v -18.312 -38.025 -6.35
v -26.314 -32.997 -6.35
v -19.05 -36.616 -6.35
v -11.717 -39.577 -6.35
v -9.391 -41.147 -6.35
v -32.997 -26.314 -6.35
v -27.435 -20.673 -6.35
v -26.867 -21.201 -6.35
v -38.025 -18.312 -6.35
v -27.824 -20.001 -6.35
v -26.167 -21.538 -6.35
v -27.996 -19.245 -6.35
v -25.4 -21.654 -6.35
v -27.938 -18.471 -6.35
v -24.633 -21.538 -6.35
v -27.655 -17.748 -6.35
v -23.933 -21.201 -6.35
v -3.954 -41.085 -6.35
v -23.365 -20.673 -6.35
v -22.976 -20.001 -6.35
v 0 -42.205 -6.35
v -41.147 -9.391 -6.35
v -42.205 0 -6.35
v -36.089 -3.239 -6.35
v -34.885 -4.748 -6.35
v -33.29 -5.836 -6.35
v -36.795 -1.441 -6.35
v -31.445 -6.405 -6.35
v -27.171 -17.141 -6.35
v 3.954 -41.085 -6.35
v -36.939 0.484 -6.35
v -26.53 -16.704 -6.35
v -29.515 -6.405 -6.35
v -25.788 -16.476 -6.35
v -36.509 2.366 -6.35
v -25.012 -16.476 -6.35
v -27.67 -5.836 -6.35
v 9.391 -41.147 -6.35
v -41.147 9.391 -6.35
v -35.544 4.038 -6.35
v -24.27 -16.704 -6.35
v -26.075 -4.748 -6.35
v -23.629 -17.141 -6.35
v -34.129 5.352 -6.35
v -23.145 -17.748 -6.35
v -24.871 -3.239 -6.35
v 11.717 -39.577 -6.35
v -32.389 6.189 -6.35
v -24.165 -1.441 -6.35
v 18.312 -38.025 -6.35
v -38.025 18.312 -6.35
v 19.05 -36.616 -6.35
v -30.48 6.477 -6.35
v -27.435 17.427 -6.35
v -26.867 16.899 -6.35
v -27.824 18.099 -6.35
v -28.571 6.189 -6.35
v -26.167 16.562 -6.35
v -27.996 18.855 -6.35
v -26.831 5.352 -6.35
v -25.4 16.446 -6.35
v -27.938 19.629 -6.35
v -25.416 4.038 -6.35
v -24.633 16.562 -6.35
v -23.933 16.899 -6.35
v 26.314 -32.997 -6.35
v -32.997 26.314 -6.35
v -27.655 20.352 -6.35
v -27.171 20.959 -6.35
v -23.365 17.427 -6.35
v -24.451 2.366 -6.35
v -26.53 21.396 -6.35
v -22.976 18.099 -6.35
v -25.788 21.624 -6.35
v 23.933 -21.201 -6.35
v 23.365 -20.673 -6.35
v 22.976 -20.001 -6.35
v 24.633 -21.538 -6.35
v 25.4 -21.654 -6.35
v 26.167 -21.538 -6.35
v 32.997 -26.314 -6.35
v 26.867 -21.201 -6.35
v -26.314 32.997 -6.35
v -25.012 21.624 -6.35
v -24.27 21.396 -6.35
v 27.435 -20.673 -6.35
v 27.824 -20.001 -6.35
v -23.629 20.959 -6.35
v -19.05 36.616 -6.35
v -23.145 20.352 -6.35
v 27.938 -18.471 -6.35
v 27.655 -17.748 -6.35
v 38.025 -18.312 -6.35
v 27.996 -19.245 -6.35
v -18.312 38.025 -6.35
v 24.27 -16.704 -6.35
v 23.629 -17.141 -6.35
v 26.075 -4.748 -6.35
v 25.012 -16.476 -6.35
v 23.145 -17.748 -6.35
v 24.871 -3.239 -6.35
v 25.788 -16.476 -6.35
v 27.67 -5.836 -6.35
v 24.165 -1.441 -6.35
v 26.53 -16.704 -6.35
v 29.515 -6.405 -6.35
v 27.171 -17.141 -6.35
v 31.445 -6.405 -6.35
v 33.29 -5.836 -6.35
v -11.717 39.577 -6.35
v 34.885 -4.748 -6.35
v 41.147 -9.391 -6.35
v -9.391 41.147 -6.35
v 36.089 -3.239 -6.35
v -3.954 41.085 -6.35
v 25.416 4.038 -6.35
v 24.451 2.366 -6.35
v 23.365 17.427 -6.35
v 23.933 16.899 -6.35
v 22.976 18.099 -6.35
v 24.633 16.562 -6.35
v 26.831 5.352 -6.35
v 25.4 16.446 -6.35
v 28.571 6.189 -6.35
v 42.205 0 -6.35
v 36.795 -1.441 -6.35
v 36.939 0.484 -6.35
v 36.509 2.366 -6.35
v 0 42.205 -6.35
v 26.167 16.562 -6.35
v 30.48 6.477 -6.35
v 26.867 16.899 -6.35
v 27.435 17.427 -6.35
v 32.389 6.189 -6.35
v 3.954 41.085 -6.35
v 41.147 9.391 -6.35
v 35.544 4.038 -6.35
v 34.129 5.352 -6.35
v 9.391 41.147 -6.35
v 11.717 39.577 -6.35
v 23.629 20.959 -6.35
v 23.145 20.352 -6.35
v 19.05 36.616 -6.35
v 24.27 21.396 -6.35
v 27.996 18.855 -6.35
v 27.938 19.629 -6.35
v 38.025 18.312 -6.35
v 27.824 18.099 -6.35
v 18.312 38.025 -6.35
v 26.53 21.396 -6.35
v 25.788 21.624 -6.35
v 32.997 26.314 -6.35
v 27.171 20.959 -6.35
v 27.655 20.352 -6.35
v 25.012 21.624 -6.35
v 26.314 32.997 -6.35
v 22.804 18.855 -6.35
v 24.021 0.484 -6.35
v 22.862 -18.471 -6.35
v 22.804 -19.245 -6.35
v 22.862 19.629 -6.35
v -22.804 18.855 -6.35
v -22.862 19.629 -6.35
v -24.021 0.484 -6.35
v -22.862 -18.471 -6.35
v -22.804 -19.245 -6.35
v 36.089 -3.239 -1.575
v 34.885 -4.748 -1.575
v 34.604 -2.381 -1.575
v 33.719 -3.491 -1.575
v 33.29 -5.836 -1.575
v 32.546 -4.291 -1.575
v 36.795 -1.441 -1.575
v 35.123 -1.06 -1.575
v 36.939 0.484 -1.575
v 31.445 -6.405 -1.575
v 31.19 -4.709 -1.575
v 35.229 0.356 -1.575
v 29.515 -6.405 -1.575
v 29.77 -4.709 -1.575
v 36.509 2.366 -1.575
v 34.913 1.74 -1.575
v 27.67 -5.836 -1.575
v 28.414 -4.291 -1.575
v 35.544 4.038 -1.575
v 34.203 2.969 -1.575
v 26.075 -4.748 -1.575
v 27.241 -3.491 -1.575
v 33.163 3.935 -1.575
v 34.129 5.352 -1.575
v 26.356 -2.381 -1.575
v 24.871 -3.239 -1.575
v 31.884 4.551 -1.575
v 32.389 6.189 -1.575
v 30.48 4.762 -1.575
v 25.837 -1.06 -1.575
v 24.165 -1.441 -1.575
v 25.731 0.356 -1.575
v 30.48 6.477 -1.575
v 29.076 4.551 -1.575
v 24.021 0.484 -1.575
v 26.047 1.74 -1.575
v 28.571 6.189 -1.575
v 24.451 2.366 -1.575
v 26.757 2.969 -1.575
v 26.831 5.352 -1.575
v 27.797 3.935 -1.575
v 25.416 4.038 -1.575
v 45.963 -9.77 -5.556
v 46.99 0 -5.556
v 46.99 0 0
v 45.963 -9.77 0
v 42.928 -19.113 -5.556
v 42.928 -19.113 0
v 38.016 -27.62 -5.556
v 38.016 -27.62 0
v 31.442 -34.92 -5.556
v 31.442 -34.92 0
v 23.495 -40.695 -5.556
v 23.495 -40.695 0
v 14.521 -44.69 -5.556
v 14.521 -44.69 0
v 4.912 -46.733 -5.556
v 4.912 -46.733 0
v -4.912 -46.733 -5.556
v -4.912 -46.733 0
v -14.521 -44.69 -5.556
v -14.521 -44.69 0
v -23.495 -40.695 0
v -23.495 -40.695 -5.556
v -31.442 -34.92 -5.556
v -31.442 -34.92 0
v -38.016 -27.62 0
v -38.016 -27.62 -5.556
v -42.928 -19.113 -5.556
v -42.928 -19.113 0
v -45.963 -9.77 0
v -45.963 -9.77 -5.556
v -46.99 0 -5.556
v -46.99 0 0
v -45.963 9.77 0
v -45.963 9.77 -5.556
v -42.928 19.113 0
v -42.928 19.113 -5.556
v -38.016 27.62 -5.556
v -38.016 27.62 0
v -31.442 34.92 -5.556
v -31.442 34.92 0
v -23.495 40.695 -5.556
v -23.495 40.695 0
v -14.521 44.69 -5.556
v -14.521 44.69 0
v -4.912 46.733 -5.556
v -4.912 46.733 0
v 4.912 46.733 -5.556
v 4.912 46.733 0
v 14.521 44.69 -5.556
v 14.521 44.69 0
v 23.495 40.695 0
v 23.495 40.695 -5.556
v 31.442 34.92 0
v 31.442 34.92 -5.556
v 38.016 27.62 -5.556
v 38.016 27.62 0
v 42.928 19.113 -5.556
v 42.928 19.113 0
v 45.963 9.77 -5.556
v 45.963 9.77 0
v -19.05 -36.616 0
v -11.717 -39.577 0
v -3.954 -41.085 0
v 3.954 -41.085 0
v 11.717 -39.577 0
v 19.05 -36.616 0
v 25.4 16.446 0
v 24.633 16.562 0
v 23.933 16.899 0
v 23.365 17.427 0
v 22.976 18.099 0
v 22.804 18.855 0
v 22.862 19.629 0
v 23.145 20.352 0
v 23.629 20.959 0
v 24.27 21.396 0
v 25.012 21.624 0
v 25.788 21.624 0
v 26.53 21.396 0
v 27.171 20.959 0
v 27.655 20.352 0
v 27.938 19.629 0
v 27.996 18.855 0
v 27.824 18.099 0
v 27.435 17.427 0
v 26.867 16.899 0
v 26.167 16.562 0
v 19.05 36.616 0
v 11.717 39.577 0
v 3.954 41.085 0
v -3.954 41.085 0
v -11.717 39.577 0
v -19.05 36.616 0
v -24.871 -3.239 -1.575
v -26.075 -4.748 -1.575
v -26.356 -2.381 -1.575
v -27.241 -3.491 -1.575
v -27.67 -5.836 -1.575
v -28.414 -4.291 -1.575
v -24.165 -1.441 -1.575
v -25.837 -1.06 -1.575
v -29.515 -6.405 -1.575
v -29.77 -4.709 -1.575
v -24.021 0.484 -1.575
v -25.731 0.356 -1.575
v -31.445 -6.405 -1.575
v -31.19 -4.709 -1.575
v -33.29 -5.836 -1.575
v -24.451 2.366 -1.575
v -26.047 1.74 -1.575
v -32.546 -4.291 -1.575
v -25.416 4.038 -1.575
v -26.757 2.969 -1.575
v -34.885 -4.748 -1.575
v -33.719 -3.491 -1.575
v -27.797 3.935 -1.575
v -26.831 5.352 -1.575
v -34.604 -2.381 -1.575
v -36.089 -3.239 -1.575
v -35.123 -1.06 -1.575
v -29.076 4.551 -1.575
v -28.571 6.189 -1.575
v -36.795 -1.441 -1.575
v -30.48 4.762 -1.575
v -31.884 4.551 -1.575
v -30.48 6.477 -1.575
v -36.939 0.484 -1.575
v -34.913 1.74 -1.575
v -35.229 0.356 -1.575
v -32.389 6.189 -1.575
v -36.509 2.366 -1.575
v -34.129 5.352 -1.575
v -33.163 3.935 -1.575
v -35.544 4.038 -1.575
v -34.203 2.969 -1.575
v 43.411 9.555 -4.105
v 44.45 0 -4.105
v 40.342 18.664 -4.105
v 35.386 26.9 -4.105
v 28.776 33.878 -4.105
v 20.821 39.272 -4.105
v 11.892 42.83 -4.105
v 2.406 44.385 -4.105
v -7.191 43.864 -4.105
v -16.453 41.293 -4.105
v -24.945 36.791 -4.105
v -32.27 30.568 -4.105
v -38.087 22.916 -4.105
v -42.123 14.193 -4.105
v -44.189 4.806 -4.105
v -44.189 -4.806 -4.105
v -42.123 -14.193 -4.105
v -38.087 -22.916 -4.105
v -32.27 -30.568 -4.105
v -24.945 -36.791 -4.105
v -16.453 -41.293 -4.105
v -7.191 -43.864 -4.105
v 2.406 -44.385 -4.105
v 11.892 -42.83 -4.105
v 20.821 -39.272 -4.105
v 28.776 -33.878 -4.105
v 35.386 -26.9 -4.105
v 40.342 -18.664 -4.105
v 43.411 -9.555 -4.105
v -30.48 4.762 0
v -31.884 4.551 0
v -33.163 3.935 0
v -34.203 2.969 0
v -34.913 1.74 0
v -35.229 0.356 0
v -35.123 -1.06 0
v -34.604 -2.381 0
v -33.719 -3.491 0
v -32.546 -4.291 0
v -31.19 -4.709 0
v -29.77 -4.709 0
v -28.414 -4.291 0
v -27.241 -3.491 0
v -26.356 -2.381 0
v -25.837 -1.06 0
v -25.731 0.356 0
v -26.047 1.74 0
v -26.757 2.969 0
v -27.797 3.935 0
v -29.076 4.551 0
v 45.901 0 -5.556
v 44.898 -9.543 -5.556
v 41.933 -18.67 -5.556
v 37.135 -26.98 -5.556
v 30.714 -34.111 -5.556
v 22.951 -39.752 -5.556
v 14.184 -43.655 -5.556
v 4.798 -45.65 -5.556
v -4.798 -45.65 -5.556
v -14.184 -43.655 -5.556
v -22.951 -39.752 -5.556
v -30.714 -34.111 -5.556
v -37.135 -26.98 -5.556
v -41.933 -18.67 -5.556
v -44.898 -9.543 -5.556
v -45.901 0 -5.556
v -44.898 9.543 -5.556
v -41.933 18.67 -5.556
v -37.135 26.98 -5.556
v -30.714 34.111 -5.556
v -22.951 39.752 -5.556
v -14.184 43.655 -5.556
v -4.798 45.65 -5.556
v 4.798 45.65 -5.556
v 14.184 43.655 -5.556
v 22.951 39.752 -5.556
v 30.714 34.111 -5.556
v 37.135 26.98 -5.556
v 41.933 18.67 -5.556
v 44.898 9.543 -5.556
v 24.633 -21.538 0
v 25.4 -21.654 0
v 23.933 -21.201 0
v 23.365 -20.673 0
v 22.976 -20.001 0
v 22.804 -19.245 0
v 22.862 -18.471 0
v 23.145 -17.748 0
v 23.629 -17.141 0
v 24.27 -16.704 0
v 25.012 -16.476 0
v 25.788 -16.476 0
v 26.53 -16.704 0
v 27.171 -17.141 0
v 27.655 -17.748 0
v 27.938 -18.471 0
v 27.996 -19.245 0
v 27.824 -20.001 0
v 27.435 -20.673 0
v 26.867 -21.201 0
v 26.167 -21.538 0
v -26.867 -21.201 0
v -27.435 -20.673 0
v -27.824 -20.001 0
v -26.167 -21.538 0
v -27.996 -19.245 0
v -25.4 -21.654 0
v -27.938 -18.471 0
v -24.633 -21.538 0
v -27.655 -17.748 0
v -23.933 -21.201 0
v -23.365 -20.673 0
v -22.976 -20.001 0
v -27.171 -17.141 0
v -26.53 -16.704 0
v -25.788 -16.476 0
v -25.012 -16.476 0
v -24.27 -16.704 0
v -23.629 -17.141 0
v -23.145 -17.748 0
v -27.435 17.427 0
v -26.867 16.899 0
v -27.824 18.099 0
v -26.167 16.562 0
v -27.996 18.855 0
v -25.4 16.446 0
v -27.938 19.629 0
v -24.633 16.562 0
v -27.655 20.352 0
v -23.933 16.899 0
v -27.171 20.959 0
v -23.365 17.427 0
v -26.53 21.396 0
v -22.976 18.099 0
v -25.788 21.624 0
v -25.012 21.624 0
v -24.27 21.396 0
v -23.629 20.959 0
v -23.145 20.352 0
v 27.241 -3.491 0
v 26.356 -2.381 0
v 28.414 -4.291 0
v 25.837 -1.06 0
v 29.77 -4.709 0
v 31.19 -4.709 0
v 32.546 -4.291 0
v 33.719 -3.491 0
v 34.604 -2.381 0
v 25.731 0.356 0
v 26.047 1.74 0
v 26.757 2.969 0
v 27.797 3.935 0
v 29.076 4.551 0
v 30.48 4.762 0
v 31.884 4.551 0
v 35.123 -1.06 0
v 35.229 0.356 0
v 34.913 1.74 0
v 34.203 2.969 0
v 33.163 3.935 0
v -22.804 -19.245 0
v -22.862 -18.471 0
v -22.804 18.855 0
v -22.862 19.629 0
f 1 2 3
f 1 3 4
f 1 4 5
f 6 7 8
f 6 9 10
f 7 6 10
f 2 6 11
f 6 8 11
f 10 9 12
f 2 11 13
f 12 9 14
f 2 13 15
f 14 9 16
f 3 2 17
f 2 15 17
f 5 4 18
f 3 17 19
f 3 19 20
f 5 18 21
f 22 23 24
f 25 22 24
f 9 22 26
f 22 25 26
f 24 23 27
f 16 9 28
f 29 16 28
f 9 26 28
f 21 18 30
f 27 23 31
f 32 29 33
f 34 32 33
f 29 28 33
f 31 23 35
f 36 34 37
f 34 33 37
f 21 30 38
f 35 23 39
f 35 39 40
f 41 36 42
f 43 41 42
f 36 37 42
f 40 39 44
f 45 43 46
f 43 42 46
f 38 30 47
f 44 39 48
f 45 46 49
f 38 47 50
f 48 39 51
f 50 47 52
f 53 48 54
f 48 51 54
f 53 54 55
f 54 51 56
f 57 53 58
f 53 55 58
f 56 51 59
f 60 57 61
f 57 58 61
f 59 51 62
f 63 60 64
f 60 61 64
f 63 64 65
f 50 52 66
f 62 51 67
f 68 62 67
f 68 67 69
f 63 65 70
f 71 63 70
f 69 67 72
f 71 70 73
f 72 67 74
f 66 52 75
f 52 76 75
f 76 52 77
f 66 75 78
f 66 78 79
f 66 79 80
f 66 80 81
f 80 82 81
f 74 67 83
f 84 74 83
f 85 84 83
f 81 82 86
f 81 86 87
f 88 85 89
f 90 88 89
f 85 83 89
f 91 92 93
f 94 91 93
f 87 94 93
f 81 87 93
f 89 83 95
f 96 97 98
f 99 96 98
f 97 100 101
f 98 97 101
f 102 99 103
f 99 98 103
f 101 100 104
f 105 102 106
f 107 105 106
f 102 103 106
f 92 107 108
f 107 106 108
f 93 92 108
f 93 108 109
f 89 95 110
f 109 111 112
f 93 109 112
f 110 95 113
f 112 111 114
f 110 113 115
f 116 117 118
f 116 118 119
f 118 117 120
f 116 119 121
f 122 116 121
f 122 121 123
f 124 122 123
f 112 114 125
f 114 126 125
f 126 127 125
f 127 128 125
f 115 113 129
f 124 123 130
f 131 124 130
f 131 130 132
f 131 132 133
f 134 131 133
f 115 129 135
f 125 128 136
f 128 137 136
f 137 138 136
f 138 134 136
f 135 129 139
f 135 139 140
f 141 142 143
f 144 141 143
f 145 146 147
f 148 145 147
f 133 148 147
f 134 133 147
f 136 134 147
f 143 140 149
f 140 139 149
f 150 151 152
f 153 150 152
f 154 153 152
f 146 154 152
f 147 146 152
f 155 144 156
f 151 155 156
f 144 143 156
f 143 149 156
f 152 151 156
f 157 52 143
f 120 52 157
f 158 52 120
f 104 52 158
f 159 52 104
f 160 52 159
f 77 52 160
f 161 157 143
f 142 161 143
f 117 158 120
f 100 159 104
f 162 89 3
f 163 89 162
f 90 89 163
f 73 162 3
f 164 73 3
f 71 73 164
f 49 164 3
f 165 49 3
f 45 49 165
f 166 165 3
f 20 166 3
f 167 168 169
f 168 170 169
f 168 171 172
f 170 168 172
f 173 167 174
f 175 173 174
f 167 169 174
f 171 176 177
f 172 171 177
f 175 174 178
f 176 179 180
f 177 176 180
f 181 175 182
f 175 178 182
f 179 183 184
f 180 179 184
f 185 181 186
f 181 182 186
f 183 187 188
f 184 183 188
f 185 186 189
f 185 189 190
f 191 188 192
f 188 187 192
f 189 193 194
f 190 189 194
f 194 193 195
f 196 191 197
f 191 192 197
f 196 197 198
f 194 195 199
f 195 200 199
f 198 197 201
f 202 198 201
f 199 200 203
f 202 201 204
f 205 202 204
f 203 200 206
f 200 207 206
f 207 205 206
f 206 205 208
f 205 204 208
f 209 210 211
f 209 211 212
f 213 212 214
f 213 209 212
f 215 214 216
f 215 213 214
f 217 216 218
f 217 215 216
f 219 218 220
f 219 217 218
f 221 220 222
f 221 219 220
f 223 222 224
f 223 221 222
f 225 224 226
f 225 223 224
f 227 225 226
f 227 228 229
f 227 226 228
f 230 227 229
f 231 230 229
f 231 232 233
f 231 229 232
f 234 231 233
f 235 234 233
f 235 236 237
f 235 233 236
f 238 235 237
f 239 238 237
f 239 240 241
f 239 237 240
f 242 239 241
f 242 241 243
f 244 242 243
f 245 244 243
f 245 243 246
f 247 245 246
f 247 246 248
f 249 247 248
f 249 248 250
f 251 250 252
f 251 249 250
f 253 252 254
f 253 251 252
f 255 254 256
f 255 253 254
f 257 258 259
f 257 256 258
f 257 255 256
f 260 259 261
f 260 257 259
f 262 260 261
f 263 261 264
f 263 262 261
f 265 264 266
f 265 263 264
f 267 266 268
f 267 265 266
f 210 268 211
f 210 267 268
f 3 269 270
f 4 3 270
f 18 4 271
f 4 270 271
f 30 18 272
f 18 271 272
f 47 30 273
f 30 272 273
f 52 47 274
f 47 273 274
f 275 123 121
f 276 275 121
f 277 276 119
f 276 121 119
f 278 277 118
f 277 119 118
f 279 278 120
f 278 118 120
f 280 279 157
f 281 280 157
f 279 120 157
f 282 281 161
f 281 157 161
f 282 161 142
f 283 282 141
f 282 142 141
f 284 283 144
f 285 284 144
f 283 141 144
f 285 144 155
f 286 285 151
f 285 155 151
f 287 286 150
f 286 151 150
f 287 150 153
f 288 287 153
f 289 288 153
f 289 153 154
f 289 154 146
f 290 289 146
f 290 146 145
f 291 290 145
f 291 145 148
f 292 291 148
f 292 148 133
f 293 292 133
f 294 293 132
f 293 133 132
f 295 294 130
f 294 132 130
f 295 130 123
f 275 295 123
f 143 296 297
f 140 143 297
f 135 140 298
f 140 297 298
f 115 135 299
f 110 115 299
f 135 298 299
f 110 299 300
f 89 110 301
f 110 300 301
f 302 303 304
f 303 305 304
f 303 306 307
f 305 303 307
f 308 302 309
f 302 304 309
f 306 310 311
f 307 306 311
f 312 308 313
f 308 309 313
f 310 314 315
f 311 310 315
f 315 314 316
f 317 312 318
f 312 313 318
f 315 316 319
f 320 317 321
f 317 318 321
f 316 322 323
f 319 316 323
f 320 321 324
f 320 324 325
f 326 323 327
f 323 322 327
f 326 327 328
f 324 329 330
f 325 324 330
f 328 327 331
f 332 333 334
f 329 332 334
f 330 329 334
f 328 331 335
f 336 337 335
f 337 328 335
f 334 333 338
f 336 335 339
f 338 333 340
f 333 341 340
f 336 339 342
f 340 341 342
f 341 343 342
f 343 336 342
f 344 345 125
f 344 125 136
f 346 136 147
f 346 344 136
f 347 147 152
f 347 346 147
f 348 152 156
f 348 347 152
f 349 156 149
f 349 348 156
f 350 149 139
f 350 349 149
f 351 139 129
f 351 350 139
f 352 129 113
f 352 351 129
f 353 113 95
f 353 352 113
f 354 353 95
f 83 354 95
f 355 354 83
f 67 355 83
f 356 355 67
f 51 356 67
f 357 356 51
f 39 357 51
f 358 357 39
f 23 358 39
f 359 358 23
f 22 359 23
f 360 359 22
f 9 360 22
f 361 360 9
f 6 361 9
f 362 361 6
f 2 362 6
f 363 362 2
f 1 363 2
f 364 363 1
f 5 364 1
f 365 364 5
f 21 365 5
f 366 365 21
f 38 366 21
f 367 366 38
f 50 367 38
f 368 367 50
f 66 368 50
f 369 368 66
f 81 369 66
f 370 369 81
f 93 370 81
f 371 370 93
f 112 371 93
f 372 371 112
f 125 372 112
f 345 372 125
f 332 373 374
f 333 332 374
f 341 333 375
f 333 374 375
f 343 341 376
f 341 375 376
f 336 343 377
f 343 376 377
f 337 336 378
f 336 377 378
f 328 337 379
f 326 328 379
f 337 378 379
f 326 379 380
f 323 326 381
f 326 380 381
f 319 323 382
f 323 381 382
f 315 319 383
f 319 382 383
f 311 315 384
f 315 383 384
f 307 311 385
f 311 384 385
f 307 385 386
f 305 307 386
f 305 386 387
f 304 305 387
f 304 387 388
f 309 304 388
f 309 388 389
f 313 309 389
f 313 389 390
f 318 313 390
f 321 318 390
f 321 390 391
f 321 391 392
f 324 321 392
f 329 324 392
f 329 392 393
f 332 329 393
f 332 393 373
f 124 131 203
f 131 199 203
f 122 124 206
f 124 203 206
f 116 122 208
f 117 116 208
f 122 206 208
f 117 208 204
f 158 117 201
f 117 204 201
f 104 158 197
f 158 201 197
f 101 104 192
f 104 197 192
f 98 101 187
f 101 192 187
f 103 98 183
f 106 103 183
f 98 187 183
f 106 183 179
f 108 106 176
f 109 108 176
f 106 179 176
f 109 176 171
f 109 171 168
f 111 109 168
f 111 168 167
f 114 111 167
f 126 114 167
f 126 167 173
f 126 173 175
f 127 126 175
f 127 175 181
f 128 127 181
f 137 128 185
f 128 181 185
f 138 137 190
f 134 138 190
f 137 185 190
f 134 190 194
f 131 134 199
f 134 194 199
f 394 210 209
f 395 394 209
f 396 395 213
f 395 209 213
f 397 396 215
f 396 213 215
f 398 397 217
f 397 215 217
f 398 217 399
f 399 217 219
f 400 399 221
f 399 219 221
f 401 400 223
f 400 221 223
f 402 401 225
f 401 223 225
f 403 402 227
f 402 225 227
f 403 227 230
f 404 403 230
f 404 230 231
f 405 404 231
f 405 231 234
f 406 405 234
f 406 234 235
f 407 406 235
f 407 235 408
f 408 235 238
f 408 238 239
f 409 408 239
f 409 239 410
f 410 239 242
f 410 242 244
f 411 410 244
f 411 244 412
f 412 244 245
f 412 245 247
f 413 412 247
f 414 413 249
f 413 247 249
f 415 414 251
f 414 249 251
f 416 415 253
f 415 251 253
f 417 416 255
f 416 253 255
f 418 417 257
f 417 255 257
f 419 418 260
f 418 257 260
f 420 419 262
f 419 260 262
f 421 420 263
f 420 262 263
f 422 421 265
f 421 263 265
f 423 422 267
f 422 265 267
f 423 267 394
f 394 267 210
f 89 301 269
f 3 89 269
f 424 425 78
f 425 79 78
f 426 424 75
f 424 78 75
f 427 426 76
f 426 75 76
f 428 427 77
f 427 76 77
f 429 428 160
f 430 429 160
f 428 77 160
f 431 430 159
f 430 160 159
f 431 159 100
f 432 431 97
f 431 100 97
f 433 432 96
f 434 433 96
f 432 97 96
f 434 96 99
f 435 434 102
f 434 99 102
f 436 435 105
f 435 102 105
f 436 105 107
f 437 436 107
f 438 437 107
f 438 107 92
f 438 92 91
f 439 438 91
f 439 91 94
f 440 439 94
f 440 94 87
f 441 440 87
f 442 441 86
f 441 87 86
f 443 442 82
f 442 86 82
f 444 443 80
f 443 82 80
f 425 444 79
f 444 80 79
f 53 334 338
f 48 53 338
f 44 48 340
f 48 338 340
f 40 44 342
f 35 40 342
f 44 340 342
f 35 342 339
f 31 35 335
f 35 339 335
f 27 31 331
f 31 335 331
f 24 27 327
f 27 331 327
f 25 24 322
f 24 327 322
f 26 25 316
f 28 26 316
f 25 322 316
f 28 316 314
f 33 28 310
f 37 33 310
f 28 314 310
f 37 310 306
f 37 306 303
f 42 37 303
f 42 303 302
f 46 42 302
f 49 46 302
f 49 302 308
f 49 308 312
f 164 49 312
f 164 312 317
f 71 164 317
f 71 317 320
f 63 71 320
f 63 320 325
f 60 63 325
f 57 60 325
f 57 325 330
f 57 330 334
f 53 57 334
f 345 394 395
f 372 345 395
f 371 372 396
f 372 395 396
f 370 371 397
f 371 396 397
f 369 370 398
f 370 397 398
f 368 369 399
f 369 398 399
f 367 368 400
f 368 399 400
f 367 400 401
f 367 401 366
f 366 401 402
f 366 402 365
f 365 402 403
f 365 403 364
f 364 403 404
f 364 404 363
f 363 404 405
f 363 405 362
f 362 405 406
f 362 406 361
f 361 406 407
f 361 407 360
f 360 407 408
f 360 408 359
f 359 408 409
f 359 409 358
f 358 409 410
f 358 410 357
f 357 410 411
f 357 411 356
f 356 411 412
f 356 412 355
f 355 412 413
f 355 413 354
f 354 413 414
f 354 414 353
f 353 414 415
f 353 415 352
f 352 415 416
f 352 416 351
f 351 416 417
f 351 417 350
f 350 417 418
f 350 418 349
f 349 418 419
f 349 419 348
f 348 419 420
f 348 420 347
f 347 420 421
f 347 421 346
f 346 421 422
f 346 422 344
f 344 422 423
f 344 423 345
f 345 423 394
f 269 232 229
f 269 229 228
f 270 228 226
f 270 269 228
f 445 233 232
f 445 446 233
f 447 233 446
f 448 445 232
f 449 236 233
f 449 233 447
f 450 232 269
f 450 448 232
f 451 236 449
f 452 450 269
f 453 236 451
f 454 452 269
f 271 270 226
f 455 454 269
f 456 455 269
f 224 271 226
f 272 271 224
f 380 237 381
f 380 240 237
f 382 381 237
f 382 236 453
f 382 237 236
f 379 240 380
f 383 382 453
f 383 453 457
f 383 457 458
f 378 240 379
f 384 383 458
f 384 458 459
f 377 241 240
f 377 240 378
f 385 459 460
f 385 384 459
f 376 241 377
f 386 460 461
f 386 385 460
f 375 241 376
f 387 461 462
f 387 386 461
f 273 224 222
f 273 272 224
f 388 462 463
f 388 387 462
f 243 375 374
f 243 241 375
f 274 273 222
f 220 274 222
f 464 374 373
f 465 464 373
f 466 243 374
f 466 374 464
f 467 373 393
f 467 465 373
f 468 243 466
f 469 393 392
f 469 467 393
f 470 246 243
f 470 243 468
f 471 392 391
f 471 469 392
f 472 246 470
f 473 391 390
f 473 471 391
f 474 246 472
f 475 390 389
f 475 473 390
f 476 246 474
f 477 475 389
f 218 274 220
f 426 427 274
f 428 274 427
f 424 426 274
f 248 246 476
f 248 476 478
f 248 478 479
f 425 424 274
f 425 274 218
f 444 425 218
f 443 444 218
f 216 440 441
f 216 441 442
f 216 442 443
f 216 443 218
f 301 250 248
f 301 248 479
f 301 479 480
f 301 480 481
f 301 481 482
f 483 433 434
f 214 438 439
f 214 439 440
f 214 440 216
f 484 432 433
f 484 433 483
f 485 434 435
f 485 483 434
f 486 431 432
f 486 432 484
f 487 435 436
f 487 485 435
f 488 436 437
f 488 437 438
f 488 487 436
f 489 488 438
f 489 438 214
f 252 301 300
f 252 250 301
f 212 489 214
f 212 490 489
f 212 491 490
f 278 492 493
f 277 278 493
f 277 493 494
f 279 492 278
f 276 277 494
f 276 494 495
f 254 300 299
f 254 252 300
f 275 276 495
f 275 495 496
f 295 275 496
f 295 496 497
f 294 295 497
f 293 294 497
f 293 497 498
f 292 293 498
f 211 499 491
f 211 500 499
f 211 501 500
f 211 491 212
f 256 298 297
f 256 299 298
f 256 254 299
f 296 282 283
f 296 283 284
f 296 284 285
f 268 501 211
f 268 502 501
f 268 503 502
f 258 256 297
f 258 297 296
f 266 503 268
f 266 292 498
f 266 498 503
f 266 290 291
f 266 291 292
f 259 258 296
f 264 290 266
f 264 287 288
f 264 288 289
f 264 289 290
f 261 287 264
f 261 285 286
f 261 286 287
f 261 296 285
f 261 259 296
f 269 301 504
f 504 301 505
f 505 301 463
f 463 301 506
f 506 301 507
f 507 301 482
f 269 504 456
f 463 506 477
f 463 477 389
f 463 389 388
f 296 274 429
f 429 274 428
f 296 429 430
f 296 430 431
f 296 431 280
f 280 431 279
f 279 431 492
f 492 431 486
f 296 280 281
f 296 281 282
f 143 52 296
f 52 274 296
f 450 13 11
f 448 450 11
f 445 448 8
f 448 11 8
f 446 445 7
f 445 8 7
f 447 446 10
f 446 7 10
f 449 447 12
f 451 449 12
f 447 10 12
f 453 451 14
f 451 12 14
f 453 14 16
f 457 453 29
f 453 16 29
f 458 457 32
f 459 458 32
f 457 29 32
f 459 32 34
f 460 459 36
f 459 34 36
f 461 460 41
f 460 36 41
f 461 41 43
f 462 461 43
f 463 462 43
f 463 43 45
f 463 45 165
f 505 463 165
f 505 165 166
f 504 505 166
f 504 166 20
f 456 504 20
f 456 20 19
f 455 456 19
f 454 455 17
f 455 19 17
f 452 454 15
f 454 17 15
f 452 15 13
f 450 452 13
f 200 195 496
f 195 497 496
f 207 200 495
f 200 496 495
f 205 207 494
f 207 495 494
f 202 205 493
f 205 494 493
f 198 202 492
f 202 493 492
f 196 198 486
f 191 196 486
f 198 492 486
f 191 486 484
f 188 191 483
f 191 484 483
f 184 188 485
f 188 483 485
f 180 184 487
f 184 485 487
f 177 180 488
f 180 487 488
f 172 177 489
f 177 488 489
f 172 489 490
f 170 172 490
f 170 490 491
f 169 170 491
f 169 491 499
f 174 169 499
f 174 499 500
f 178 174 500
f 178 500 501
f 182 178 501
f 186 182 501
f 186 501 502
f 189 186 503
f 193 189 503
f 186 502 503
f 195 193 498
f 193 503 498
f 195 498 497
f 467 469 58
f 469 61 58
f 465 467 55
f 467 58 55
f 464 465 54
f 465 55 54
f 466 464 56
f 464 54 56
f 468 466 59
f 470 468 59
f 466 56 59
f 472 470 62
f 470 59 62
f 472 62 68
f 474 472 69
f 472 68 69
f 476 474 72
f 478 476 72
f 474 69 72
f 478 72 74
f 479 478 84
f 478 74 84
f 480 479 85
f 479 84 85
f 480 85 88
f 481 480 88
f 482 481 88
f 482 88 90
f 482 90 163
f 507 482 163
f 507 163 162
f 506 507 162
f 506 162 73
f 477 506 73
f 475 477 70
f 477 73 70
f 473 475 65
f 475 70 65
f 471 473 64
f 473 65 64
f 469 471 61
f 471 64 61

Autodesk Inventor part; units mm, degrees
ref_plane "YZ Plane" through (0, 0, 0) normal (1, 0, 0) x (0, 1, 0)
ref_plane "XZ Plane" through (0, 0, 0) normal (0, 1, 0) x (-1, 0, 0)
ref_plane "XY Plane" through (0, 0, 0) normal (0, 0, 1) x (1, 0, 0)
sketch "Sketch1" plane through (0, 0, 0) normal (0, 1, 0) x (-1, 0, 0)
  line L0 (0, 0) -> (-46.99, 0)
  line L1 (-46.99, 0) -> (-46.99, -5.5563)
  line L2 (-46.99, -5.5563) -> (0, -5.5562)
  line L3 (0, -5.5562) -> (0, 0)
  line L4 (-44.45, -4.1049) -> (-42.2049, -6.35)
  line L5 (-42.2049, -6.35) -> (-44.45, -8.5951)
  line L6 (-44.45, -8.5951) -> (-46.6951, -6.35)
  line L7 (-46.6951, -6.35) -> (-44.45, -4.1049)
  line L8 (-42.2049, -6.35) -> (0, -6.35)
  line L9 (0, -6.35) -> (0, -5.5562)
  point P0 (-44.45, -6.35)
  point P1 (-45.9013, -5.5563)
  dimension "d0" = 46.99
  dimension "d2" = 3.175
  dimension "d3" = 6.35
  dimension "d4" = 44.45
  dimension "d10" = 0.7937
revolve "Revolution1" add sketch "Sketch1" angle 360 about axis through (0, 0, -5.5562) along (0, 0, 1) contours L3 L2 L4 L7 L1 L0 | L9 L8 L4 L2
sketch "Sketch2" plane through (0, 0, 0) normal (0, 0, 1) x (1, 0, 0)
  circle A0 centre (0, 0) radius 41.275
  line L0 (-19.05, 36.6159) -> (-19.05, -36.6159)
  line L1 (19.05, -36.6159) -> (19.05, 36.6159)
  point P0 (0, 0)
  dimension "d6" = 82.55
  dimension "d7" = 38.1
extrude "Extrusion1" cut sketch "Sketch2" against normal through all contours L1 A0 L0
sketch "Sketch3" plane through (0, 0, 0) normal (0, 0, 1) x (1, 0, 0)
  line L0 (25.4, -19.05) -> (-25.4, -19.05) construction
  line L1 (-25.4, -19.05) -> (-25.4, 19.05) construction
  line L2 (-25.4, 19.05) -> (25.4, 19.05) construction
  line L3 (25.4, 19.05) -> (25.4, -19.05) construction
  line L4 (25.4, -19.05) -> (-25.4, 19.05) construction
  line L5 (25.4, 19.05) -> (-25.4, -19.05) construction
  point P0 (0, 0)
  point P1 (0, 0)
  dimension "d11" = 50.8
  dimension "d12" = 38.1
hole "Hole1" at (25.4, -19.05, 0) at (25.4, 19.05, 0) at (-25.4, 19.05, 0) at (-25.4, -19.05, 0) direction (0, 0, -1) diameter 5.207 end through all
sketch "Sketch4" plane through (0, 0, -6.35) normal (0, 0, -1) x (-1, 0, 0)
  circle A0 centre (0, 0) radius 30.48 construction
  point P0 (0, 0)
  point P1 (-30.48, 0)
  point P2 (30.48, 0)
  dimension "d20" = 60.96
hole "Hole2" at (30.48, 0, -6.35) at (-30.48, 0, -6.35) direction (0, 0, 1) diameter 9.525 end through all counterbore diameter 12.954 counterbore depth 4.7752
properties part number "CarriageCap_V4" material "ABS Plastic"
